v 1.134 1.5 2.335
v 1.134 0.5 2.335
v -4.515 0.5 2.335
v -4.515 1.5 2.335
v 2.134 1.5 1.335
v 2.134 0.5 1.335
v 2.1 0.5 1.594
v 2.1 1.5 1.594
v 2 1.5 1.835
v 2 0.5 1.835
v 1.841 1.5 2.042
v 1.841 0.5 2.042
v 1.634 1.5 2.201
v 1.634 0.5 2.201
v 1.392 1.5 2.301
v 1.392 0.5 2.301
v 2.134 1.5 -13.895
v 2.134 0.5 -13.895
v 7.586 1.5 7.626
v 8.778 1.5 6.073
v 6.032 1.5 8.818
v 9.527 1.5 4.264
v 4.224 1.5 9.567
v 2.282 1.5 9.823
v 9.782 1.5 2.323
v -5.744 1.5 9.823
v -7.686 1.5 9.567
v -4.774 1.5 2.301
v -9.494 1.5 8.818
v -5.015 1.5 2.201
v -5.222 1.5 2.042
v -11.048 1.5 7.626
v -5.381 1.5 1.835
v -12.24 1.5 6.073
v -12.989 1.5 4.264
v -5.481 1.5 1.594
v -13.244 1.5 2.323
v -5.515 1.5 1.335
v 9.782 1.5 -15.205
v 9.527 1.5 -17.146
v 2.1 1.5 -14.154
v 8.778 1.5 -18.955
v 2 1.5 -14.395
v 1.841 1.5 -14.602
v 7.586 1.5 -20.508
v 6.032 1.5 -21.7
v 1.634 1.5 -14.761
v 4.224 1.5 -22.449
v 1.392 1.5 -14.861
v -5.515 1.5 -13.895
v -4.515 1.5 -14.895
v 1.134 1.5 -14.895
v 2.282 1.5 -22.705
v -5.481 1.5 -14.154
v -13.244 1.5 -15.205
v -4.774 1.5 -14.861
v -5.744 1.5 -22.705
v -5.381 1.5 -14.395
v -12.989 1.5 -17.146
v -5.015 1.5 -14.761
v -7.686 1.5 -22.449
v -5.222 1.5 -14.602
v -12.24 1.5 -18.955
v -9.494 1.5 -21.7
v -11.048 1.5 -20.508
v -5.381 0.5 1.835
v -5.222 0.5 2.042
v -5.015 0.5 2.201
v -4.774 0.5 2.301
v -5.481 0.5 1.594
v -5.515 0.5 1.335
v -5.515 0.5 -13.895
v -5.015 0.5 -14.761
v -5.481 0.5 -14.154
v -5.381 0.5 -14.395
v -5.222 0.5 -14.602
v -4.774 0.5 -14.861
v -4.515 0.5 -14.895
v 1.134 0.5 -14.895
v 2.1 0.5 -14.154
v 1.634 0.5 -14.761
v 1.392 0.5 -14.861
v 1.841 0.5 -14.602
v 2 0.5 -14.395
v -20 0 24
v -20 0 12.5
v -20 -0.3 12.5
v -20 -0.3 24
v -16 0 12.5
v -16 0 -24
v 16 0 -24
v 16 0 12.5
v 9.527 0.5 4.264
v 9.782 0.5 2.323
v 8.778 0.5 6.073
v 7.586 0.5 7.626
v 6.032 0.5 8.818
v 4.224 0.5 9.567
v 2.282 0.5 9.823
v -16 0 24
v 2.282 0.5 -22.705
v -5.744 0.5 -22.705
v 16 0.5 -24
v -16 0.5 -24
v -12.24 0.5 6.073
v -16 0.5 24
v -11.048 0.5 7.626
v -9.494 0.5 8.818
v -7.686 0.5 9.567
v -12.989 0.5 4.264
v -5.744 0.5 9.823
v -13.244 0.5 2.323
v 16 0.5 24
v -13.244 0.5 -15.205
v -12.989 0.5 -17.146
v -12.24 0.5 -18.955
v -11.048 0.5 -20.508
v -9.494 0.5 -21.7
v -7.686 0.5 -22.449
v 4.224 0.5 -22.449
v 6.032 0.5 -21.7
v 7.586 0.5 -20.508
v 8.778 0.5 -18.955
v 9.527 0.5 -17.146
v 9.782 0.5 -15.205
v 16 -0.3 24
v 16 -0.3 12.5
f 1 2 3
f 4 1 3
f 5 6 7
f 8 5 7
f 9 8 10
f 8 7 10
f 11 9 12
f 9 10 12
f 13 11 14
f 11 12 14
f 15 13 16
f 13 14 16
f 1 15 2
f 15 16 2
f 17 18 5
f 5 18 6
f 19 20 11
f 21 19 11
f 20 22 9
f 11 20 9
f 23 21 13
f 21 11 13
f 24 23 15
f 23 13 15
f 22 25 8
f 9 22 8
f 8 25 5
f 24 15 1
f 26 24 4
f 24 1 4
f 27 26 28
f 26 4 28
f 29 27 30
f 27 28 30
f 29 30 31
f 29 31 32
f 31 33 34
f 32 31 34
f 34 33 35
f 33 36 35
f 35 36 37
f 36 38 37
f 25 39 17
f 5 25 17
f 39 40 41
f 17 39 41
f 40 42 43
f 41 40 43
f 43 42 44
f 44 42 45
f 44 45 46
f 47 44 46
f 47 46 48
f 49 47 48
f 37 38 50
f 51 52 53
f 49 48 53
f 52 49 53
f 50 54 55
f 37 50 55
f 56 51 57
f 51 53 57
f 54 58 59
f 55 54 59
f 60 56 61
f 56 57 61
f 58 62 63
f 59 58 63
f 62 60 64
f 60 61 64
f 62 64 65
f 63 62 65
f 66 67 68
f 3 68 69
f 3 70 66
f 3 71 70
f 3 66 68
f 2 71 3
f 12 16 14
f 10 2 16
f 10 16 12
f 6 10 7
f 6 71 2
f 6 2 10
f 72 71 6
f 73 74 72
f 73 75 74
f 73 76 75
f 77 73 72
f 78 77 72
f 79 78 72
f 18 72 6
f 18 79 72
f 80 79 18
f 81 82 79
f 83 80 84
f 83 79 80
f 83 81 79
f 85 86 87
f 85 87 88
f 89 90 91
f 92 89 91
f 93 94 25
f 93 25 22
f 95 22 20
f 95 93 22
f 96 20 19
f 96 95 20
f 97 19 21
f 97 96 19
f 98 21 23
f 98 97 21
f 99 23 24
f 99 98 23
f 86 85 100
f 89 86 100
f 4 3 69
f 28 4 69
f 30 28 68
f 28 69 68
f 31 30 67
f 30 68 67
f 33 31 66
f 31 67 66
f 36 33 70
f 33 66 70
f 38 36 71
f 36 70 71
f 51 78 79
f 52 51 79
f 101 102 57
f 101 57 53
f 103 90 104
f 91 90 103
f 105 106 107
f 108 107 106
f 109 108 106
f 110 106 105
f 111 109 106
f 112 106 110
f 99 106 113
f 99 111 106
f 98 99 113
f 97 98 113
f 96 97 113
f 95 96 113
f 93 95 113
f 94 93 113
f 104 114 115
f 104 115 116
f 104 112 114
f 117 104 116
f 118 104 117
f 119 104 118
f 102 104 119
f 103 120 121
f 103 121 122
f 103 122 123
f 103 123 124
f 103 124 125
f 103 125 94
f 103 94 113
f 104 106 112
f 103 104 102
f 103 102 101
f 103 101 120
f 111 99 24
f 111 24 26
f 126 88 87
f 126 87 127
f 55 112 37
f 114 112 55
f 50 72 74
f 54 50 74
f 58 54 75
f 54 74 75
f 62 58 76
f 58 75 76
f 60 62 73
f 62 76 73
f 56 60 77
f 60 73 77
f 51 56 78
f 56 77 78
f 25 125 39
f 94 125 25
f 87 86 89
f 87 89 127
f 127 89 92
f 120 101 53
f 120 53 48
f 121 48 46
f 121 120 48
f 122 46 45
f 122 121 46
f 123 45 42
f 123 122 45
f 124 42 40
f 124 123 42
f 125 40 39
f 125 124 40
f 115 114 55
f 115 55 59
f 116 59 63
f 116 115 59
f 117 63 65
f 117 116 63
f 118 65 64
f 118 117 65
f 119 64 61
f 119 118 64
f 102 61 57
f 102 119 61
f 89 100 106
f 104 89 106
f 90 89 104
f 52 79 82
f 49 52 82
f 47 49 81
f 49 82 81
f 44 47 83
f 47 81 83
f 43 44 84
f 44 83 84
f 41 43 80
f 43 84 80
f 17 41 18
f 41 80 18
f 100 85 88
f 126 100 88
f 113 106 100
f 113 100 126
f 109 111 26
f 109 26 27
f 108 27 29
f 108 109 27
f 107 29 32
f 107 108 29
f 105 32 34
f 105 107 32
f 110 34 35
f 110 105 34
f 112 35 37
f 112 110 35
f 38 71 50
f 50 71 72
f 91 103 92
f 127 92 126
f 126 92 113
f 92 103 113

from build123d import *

# Parameters (mm, degrees)
SKETCH1_W           = 32
SKETCH1_H           = 48
BOSS_EXTRUDE1_DEPTH = 0.5
BOSS_EXTRUDE2_DEPTH = 1
SKETCH3_W           = 36
SKETCH3_H           = 11.5
BOSS_EXTRUDE3_DEPTH = 0.3


with BuildPart() as part:
    # Sketch1 → Boss-Extrude1 (new body)
    with BuildSketch(Plane(origin=(0, 0, 0), x_dir=(1, 0, 0), z_dir=(0, 1, 0))):
        Rectangle(SKETCH1_W, SKETCH1_H)
    extrude(amount=BOSS_EXTRUDE1_DEPTH)

    # Sketch2 → Boss-Extrude2 (add)
    with BuildSketch(Plane(origin=(0, 0.5, 0), x_dir=(1, 0, 0), z_dir=(0, 1, 0))):
        with BuildLine():
            Line((-5.744434592, 22.704745015), (2.282363543, 22.704745015))
            ThreePointArc((2.282363543, 22.704745015), (7.585664402, 20.508045873), (9.782363543, 15.204745015))
            Line((9.782363543, 15.204745015), (9.782363543, -2.322620184))
            ThreePointArc((9.782363543, -2.322620184), (7.585664402, -7.625921042), (2.282363543, -9.822620184))
            Line((2.282363543, -9.822620184), (-5.744434592, -9.822620184))
            ThreePointArc((-5.744434592, -9.822620184), (-11.047735451, -7.625921042), (-13.244434592, -2.322620184))
            Line((-13.244434592, -2.322620184), (-13.244434592, 15.204745015))
            ThreePointArc((-13.244434592, 15.204745015), (-11.047735451, 20.508045873), (-5.744434592, 22.704745015))
        make_face()
        with BuildLine():
            Line((-4.515159693, 14.894956836), (1.133601925, 14.894956836))
            ThreePointArc((1.133601925, 14.894956836), (1.840708706, 14.602063617), (2.133601925, 13.894956836))
            Line((2.133601925, 13.894956836), (2.133601925, -1.334885126))
            ThreePointArc((2.133601925, -1.334885126), (1.840708706, -2.041991907), (1.133601925, -2.334885126))
            Line((1.133601925, -2.334885126), (-4.515159693, -2.334885126))
            ThreePointArc((-4.515159693, -2.334885126), (-5.222266474, -2.041991907), (-5.515159693, -1.334885126))
            Line((-5.515159693, -1.334885126), (-5.515159693, 13.894956836))
            ThreePointArc((-5.515159693, 13.894956836), (-5.222266474, 14.602063617), (-4.515159693, 14.894956836))
        make_face(mode=Mode.SUBTRACT)
    extrude(amount=BOSS_EXTRUDE2_DEPTH)

    # Sketch3 → Boss-Extrude3 (add)
    with BuildSketch(Plane.XZ):
        with Locations((-2, 18.25)):
            Rectangle(SKETCH3_W, SKETCH3_H)
    extrude(amount=BOSS_EXTRUDE3_DEPTH)


solid = part.part
